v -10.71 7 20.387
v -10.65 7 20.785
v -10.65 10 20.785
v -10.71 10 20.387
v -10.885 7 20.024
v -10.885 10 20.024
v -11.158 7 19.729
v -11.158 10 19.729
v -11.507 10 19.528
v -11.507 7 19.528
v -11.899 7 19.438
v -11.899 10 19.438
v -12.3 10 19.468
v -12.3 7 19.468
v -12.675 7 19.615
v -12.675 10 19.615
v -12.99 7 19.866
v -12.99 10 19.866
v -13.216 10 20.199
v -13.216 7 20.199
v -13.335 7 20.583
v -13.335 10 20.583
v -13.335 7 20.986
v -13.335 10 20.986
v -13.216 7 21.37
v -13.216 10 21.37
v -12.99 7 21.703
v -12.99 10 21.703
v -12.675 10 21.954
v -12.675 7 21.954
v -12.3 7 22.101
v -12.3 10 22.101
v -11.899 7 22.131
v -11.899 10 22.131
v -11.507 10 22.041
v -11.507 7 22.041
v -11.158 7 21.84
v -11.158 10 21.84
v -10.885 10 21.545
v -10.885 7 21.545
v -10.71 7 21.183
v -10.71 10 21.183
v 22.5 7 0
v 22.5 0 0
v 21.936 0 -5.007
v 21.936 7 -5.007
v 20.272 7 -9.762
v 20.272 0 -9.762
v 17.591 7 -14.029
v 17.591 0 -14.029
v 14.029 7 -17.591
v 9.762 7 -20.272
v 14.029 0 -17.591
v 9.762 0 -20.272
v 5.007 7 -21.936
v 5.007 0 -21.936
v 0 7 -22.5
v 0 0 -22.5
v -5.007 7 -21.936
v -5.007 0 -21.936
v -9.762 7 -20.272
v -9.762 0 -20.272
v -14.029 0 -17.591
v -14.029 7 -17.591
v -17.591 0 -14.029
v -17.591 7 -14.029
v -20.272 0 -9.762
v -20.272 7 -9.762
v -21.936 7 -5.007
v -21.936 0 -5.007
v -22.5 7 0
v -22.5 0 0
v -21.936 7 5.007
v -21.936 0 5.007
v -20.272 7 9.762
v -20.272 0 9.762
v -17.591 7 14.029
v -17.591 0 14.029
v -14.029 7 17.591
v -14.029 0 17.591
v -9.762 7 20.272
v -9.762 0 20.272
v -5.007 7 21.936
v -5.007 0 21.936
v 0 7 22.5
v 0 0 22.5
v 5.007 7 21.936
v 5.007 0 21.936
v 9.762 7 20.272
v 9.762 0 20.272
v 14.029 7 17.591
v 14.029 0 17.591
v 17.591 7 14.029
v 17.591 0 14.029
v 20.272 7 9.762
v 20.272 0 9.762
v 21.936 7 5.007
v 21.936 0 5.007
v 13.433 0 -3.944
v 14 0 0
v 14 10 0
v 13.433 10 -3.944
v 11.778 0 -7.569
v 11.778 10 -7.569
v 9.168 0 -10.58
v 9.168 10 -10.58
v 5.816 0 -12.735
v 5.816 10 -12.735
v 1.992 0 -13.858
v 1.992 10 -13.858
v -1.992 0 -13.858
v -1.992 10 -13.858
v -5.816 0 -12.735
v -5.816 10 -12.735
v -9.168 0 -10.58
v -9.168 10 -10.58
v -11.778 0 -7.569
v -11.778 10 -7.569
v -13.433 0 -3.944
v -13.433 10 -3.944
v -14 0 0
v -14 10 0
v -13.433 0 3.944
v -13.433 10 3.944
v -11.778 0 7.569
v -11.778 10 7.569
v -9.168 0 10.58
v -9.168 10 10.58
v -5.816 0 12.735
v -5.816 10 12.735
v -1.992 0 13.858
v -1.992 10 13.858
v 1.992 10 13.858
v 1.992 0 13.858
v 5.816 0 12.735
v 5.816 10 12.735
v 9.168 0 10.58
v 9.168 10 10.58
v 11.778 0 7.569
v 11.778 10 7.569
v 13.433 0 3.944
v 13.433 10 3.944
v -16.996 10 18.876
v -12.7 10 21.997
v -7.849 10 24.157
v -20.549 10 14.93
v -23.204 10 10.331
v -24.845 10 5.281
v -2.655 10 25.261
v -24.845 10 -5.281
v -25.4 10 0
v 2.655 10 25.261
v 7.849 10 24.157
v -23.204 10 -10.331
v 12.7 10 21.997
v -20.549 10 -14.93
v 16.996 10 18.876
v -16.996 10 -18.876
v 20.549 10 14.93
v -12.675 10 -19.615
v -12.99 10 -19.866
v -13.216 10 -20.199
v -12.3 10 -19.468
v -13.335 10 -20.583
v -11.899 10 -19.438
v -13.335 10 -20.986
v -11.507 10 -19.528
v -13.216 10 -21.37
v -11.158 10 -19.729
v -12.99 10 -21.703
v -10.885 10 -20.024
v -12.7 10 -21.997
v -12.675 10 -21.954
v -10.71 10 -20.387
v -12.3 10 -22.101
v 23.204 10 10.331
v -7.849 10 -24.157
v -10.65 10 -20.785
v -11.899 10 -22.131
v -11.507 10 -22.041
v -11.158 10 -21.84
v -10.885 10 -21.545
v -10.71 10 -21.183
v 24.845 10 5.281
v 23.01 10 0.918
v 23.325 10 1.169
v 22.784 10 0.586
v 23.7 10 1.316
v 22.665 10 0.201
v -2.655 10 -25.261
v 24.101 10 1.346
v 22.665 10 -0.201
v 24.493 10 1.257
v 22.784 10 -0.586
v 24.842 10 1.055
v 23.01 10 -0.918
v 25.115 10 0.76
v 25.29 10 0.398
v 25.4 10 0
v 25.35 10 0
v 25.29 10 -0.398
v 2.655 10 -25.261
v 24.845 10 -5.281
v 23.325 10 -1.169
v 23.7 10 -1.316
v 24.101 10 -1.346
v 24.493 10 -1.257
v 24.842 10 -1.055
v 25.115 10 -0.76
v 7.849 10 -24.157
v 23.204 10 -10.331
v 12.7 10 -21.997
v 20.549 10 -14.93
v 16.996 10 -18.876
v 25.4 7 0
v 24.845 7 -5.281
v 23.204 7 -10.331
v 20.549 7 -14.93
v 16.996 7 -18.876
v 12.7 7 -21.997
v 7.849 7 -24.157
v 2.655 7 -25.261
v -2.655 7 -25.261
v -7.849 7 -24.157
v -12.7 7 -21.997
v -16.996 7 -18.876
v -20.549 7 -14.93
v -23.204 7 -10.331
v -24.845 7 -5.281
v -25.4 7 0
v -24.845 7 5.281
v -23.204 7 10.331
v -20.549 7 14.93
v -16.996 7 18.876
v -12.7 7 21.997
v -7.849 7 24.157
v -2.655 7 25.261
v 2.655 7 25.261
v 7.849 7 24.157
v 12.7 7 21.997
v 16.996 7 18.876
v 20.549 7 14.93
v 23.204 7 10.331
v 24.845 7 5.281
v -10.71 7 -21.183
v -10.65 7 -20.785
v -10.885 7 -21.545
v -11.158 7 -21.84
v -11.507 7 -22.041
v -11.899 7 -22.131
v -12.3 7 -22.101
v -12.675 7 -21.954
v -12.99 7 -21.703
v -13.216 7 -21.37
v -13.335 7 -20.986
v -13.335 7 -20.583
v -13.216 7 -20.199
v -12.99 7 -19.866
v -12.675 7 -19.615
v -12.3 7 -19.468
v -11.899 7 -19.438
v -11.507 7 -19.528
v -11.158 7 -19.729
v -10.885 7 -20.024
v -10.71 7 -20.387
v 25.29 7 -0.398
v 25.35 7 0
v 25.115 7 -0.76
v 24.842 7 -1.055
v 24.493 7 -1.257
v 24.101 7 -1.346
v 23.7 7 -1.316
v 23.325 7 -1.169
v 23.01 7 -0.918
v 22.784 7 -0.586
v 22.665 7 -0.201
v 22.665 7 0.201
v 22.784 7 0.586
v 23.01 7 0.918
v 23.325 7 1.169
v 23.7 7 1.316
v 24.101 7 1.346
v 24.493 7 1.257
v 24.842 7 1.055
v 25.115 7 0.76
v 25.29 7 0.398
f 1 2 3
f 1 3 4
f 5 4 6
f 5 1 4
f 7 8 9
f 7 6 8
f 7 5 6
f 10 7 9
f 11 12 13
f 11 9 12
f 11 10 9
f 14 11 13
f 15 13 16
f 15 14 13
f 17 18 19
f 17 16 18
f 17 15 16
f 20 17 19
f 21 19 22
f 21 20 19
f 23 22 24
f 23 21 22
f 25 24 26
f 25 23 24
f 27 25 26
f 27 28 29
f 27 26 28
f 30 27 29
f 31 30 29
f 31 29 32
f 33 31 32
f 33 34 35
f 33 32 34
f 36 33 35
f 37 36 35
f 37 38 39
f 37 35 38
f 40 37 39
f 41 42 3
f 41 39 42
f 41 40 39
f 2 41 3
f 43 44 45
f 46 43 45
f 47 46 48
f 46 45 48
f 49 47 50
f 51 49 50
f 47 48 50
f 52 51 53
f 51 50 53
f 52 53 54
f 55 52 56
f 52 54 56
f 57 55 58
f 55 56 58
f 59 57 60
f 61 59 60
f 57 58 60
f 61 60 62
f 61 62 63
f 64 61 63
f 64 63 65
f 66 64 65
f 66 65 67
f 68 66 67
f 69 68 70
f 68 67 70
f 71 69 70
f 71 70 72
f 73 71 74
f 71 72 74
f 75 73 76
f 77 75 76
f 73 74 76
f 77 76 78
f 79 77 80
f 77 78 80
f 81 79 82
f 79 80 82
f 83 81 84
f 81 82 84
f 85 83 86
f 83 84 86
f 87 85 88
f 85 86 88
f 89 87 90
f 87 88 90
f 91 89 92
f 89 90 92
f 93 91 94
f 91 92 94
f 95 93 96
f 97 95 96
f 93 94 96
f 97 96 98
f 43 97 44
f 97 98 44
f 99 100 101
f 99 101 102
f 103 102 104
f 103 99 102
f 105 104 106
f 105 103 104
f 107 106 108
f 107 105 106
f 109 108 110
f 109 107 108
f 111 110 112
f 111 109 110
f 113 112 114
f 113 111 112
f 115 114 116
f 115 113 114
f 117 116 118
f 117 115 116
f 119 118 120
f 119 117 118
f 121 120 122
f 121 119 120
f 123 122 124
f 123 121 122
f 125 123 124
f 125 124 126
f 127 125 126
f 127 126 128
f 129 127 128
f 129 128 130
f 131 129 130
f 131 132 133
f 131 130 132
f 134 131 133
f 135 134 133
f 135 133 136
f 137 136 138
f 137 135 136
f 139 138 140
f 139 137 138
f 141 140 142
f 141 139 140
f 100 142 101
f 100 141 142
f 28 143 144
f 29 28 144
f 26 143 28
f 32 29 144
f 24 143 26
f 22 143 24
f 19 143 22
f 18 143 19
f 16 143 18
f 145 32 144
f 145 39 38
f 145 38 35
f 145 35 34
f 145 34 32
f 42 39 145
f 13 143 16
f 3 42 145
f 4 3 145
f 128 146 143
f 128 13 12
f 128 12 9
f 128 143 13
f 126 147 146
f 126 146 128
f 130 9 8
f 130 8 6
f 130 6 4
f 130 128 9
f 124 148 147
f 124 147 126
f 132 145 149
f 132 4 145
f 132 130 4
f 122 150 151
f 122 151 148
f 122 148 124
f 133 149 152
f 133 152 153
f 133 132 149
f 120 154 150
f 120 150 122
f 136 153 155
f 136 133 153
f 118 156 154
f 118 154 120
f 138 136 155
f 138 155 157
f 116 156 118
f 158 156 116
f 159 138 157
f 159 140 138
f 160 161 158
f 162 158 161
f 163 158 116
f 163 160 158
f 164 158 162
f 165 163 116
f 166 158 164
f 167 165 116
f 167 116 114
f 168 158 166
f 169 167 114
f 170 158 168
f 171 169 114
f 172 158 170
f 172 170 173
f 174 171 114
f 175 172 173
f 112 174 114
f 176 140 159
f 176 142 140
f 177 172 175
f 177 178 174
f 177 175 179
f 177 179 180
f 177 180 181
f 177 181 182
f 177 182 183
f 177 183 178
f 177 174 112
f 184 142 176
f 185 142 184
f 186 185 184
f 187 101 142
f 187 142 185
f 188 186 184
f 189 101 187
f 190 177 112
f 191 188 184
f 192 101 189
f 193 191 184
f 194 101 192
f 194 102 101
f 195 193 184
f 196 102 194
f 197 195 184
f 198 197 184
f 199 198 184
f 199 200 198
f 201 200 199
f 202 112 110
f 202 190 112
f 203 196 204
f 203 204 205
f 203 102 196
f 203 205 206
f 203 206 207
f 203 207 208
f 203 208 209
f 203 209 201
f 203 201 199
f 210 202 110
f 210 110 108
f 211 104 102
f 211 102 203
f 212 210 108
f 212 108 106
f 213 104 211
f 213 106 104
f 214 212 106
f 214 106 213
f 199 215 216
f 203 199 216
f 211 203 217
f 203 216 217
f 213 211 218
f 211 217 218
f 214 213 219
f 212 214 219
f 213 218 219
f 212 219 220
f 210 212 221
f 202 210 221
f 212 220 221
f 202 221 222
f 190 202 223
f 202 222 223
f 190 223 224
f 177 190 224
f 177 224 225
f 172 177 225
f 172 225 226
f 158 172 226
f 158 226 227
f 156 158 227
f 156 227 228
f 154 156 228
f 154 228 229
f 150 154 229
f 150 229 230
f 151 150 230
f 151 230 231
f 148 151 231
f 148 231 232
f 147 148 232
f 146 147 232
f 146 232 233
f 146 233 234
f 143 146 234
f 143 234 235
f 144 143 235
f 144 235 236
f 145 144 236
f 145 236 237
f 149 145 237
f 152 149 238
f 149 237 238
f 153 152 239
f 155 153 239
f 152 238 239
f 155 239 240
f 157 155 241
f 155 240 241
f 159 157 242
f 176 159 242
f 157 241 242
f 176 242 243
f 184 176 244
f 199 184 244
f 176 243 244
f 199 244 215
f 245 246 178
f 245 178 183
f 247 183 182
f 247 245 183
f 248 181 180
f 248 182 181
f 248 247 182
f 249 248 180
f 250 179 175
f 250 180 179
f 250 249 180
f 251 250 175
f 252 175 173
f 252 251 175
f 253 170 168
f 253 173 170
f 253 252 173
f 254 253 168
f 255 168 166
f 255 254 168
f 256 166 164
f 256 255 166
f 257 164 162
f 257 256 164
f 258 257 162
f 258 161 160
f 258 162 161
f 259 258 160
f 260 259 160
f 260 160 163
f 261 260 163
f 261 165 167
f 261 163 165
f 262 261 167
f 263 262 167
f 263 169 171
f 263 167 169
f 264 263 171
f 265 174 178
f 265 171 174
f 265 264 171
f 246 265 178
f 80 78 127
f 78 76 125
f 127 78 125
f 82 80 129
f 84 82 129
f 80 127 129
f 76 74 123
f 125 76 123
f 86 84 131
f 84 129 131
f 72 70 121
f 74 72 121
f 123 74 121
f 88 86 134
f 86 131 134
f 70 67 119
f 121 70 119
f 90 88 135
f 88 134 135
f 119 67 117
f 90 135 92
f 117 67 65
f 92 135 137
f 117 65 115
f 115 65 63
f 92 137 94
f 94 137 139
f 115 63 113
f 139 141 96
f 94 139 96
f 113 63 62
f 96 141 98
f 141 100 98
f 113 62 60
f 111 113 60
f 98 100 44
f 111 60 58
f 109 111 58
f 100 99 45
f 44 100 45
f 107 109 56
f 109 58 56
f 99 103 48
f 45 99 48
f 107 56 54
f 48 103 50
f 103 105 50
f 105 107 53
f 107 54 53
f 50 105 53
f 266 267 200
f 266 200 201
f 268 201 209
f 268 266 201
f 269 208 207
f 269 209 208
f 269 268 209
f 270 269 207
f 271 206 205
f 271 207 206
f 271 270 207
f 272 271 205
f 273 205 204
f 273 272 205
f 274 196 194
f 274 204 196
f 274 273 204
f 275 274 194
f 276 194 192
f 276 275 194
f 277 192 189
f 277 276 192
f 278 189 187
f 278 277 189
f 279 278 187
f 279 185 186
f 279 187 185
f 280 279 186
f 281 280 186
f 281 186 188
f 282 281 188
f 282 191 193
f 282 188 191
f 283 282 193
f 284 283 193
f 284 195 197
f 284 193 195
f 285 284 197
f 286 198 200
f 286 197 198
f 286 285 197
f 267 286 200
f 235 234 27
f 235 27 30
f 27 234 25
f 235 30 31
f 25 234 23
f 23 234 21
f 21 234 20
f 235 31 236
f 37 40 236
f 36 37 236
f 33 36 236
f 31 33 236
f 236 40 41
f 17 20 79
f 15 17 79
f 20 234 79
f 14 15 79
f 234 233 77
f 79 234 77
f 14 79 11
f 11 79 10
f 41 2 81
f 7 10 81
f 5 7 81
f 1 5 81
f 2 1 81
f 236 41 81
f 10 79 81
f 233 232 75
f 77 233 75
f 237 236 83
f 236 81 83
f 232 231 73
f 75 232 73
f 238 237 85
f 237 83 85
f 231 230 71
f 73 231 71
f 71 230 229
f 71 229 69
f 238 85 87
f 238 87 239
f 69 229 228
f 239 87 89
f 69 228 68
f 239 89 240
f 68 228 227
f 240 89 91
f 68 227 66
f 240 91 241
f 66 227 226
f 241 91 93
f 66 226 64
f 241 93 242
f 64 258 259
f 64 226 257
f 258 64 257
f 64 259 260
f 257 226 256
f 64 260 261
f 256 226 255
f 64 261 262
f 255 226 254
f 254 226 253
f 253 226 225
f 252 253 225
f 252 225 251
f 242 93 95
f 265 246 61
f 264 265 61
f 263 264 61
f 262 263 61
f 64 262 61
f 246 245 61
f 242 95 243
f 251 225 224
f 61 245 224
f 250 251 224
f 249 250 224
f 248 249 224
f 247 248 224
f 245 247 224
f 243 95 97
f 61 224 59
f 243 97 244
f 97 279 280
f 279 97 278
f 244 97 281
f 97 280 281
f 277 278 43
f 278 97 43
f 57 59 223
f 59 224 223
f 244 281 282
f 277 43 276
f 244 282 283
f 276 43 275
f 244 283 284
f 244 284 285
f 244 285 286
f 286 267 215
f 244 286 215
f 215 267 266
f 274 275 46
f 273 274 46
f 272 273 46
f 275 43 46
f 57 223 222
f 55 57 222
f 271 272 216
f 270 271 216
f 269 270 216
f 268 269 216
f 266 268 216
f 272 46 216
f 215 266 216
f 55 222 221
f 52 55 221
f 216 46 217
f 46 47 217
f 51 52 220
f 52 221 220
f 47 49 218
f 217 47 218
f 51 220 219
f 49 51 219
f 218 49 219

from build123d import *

# Parameters (mm, degrees)
CROQUIS1_R              = 25.4
SALIENTE_EXTRUIR2_DEPTH = 10
CROQUIS4_R              = 14
CORTAR_EXTRUIR2_DEPTH   = 47
CROQUIS5_R              = 25.4
CROQUIS5_R_2            = 22.5
CORTAR_EXTRUIR4_DEPTH   = 7
CROQUIS6_R              = 1.35
CORTAR_EXTRUIR5_DEPTH   = 37


with BuildPart() as part:
    # Croquis1 → Saliente-Extruir2 (new body)
    with BuildSketch(Plane(origin=(0, 0, 0), x_dir=(1, 0, 0), z_dir=(0, 1, 0))):
        Circle(CROQUIS1_R)
    extrude(amount=SALIENTE_EXTRUIR2_DEPTH)

    # Croquis4 → Cortar-Extruir2 (cut)
    with BuildSketch(Plane(origin=(0, 0, 0), x_dir=(1, 0, 0), z_dir=(0, 1, 0))):
        Circle(CROQUIS4_R)
    extrude(amount=CORTAR_EXTRUIR2_DEPTH, mode=Mode.SUBTRACT)

    # Croquis5 → Cortar-Extruir4 (cut)
    with BuildSketch(Plane(origin=(0, 0, 0), x_dir=(1, 0, 0), z_dir=(0, 1, 0))):
        Circle(CROQUIS5_R)
        Circle(CROQUIS5_R_2, mode=Mode.SUBTRACT)
    extrude(amount=CORTAR_EXTRUIR4_DEPTH, mode=Mode.SUBTRACT)

    # Croquis6 → Cortar-Extruir5 (cut)
    with BuildSketch(Plane(origin=(0, 0, 0), x_dir=(1, 0, 0), z_dir=(0, 1, 0))):
        with Locations((24, 0)):
            Circle(CROQUIS6_R)
        with Locations((-12, -20.784609691)):
            Circle(CROQUIS6_R)
        with Locations((-12, 20.784609691)):
            Circle(CROQUIS6_R)
    extrude(amount=CORTAR_EXTRUIR5_DEPTH, mode=Mode.SUBTRACT)


solid = part.part
